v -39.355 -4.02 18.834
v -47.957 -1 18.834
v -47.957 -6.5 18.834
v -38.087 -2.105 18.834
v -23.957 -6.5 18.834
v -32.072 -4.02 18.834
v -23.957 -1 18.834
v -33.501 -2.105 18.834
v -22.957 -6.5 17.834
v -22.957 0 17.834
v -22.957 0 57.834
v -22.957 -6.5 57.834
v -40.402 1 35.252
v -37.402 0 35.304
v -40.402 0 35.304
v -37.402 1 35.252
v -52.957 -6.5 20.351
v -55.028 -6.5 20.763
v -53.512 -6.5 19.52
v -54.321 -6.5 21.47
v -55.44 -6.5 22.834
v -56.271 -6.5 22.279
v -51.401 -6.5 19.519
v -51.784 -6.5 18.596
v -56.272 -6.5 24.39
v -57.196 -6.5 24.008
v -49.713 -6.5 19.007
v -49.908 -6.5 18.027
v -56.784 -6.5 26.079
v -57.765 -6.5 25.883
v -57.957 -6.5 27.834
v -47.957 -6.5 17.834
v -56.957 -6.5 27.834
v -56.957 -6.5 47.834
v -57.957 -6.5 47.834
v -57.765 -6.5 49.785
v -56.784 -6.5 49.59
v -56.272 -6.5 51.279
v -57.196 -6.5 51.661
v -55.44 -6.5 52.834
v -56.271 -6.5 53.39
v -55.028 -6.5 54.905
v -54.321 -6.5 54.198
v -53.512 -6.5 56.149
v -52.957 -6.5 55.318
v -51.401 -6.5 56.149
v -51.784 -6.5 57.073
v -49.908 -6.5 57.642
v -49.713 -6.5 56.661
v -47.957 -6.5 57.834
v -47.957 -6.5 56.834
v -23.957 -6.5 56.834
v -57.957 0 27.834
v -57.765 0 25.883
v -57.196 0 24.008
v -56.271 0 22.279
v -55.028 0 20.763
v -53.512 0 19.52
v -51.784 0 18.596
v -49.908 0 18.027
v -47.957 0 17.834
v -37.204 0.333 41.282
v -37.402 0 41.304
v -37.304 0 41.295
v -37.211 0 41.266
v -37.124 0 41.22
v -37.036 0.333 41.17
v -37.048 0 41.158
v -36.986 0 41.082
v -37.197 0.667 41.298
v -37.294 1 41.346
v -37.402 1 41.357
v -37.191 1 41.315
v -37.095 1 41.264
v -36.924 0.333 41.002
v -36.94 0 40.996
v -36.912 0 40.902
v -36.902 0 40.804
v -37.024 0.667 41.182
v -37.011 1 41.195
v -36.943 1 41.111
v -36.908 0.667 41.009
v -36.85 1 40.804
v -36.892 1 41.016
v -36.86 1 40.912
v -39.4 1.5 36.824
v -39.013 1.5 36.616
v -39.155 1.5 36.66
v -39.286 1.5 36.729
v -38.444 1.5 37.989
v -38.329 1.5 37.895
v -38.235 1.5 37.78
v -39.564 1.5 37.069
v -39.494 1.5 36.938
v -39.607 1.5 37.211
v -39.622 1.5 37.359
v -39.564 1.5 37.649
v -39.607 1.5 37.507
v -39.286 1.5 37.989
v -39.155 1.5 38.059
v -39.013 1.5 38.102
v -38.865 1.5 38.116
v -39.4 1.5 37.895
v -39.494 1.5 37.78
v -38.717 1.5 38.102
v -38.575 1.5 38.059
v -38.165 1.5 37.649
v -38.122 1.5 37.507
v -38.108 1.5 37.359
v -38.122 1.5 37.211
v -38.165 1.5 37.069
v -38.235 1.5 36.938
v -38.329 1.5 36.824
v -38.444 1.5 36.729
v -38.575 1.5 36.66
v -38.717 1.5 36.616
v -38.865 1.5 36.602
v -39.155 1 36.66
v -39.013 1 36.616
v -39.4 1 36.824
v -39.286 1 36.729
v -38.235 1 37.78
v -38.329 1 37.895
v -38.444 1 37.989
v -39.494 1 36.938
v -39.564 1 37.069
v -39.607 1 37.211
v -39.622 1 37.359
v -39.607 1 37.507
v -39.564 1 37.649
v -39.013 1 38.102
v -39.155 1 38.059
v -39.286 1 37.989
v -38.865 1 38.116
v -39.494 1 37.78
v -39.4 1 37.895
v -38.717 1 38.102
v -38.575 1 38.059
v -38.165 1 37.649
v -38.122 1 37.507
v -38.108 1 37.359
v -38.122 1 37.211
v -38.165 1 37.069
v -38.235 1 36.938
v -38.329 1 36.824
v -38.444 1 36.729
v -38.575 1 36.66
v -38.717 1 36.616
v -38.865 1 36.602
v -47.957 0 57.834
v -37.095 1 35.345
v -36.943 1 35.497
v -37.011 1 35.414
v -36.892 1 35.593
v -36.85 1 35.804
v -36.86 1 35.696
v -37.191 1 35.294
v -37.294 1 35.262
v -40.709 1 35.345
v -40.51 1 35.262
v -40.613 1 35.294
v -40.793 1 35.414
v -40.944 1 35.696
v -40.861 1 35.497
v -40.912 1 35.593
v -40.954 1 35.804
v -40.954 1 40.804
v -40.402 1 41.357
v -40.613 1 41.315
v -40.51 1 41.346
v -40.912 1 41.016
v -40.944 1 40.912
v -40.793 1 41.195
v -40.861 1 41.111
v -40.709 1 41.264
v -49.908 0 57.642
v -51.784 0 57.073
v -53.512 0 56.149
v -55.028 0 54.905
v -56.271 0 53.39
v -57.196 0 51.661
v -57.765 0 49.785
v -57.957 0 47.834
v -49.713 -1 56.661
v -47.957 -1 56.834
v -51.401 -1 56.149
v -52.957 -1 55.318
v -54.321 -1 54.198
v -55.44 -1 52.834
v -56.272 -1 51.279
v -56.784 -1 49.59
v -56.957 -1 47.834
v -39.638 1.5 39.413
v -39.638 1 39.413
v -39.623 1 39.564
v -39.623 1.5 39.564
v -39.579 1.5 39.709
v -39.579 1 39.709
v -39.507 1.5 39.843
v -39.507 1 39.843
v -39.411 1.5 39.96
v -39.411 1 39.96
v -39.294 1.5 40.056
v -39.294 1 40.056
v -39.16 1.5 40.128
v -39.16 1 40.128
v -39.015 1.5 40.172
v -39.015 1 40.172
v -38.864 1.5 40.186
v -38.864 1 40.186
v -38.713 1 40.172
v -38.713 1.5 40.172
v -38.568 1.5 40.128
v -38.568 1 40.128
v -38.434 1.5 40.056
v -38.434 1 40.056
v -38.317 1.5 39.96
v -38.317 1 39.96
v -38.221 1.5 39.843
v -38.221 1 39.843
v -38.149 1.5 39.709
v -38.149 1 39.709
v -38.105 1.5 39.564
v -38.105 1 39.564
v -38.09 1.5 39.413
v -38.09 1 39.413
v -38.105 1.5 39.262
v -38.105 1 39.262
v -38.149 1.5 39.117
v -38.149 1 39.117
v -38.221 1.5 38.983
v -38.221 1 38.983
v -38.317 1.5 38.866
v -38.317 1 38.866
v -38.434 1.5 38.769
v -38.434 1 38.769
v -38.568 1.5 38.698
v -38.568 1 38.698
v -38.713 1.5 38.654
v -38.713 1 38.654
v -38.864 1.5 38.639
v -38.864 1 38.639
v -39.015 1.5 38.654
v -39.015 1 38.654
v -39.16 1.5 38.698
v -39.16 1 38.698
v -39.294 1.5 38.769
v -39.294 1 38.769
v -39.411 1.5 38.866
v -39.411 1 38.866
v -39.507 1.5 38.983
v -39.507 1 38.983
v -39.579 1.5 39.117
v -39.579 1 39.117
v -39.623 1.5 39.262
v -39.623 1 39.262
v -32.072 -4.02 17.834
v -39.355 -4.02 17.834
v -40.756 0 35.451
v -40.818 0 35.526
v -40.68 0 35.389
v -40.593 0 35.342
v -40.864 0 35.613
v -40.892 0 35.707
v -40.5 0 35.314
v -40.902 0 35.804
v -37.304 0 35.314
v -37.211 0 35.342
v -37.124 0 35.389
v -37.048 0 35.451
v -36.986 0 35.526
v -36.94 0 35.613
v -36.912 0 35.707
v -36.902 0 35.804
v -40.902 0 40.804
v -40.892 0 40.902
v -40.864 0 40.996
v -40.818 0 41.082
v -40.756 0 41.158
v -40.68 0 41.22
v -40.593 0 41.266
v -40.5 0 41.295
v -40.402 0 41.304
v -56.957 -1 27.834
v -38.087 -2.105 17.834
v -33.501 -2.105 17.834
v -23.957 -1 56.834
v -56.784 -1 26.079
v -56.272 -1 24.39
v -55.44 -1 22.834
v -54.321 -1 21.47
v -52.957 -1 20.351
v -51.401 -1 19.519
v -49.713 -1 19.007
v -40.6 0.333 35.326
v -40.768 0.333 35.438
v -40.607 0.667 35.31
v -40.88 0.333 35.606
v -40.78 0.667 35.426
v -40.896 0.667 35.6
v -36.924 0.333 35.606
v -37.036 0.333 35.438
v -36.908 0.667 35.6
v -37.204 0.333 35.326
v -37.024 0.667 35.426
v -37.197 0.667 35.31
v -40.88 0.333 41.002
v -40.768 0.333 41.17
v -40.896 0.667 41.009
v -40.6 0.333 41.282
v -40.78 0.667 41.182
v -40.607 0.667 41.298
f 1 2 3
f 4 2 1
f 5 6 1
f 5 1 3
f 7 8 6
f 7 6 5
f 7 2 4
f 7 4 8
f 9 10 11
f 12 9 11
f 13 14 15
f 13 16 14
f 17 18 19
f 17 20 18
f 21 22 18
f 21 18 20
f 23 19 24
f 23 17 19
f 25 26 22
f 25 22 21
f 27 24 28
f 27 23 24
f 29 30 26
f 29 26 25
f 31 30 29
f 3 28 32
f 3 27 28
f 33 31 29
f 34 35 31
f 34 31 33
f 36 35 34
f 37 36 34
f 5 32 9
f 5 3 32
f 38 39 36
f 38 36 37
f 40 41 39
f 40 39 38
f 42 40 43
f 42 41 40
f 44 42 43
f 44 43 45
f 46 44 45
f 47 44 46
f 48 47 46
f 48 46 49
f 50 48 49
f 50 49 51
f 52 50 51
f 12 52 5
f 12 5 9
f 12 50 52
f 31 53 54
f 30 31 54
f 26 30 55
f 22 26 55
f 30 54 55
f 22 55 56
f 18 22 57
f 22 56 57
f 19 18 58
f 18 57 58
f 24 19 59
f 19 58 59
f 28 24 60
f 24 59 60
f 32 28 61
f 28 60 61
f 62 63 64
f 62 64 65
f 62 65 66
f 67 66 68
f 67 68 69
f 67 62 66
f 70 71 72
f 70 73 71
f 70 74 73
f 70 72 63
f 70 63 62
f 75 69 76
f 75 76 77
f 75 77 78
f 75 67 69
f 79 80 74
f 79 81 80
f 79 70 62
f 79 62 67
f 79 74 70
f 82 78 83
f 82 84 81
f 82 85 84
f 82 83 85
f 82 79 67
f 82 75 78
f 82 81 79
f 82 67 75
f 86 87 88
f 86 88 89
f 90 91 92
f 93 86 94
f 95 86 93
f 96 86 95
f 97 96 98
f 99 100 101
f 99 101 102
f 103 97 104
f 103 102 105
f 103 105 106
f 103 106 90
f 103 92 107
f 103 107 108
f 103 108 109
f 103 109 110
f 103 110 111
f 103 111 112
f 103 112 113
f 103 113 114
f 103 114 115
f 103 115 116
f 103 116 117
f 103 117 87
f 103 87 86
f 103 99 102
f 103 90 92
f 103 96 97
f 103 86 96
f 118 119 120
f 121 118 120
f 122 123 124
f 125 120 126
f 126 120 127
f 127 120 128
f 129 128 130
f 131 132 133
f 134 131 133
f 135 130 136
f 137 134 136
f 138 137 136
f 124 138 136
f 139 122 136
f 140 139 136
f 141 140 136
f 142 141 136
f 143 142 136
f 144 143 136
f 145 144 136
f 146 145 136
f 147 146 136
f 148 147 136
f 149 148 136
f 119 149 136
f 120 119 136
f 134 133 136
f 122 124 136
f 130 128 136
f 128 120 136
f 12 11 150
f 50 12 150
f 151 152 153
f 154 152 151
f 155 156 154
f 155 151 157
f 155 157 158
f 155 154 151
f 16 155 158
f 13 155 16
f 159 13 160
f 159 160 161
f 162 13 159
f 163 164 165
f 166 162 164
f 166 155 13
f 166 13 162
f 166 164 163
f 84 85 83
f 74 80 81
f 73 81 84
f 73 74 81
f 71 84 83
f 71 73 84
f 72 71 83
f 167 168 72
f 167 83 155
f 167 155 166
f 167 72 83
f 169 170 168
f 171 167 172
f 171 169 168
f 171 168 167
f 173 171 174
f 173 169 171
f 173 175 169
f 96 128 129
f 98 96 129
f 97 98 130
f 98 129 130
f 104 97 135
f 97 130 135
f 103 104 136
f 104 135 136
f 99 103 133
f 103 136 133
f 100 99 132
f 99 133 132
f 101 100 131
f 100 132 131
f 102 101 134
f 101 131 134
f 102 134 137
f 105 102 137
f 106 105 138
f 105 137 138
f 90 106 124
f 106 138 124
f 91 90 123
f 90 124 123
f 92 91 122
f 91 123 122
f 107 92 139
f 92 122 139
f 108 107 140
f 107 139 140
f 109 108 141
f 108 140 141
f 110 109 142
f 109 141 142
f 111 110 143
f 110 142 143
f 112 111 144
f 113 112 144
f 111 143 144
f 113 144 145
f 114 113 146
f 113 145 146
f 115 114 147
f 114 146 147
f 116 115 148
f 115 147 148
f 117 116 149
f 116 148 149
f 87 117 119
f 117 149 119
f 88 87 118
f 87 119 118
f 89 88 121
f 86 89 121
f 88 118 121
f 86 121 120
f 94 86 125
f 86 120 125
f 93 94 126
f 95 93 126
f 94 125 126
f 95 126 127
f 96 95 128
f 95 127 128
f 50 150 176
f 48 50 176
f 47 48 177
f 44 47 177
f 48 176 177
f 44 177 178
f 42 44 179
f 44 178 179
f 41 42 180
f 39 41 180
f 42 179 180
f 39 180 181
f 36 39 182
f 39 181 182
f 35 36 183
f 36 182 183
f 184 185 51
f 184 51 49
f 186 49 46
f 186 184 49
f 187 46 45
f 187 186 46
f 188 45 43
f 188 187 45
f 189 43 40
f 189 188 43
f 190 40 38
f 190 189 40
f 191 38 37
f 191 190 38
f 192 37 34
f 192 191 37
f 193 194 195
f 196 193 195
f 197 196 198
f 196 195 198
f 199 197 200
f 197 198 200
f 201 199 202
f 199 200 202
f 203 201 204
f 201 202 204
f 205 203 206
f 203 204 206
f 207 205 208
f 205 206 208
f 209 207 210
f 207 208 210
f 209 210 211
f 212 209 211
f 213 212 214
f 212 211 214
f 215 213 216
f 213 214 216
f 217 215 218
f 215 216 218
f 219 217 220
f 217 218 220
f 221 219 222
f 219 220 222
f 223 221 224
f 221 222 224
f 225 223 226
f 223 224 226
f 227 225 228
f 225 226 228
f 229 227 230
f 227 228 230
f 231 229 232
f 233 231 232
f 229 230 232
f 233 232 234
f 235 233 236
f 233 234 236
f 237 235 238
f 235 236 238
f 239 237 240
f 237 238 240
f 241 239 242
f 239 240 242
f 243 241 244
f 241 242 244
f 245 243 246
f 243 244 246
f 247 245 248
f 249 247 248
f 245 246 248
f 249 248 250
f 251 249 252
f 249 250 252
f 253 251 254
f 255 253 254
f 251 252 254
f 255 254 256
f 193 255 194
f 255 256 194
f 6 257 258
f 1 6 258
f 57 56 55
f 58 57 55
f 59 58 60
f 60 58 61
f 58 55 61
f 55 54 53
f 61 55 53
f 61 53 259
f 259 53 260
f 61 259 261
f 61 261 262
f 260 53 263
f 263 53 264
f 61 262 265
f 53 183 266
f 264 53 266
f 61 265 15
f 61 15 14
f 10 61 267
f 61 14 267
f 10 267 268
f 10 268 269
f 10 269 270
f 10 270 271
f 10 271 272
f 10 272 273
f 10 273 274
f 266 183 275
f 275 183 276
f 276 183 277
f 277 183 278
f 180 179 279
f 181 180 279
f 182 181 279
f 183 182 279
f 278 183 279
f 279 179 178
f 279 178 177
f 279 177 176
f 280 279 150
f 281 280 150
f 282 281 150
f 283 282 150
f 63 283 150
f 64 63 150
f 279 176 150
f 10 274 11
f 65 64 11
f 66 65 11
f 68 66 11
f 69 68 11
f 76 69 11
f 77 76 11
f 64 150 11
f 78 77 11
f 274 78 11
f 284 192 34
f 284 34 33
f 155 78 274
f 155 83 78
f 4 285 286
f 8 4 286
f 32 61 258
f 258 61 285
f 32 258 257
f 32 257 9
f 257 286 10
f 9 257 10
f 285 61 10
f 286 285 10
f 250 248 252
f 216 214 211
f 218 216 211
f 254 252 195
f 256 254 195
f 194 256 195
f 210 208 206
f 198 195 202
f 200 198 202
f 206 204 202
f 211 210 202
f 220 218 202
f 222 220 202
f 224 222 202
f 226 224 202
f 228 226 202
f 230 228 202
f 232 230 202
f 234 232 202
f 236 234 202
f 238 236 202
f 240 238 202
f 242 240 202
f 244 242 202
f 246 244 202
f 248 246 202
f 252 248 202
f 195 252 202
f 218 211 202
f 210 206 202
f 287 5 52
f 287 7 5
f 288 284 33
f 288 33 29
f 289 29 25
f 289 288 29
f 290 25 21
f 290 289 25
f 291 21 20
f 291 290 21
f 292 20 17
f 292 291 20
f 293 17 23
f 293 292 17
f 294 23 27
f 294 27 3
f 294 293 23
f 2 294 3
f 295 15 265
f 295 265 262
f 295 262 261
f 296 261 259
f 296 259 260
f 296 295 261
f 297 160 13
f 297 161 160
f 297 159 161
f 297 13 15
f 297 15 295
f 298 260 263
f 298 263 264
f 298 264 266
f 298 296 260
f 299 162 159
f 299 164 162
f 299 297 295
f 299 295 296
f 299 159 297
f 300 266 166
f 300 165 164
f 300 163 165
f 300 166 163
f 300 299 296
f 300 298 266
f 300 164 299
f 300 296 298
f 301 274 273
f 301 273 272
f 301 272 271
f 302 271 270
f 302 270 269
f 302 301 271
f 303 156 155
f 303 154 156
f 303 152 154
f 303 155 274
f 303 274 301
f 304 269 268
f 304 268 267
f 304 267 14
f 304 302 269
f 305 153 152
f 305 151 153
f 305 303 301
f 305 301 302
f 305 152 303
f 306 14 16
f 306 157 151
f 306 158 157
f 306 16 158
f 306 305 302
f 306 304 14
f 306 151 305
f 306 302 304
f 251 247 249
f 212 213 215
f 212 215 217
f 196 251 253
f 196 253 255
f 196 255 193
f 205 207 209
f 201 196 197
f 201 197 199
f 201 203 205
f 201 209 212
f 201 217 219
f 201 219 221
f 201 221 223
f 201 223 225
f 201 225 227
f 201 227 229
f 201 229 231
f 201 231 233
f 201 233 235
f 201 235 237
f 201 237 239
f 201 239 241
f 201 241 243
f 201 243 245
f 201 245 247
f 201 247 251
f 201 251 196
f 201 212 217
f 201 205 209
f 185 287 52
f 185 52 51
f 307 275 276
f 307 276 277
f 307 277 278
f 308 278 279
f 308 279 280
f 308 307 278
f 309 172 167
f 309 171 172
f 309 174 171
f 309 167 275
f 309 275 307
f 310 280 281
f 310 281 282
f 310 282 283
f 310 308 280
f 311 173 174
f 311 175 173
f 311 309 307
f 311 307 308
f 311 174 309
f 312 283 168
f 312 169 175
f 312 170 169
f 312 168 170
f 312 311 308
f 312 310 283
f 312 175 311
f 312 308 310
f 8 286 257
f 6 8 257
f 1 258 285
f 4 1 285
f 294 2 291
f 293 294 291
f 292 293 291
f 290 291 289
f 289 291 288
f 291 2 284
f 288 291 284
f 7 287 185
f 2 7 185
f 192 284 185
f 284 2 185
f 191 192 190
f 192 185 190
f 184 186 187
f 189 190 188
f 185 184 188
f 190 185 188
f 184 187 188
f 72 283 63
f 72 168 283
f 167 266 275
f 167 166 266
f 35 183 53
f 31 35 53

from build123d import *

# Parameters (mm, degrees)
F1_DEPTH      = 6.5
F2_T          = -1
F4_DEPTH      = 25
F6_DEPTH      = 1
F6_TAPER      = -3
F6_DEPTH_BACK = 1
F8_R          = 0.7736909367
F9_DEPTH      = 0.5
F8_R_2        = 0.7572129145


with BuildPart() as f1:
    # F0 (on Front) → F1 (new body)
    with BuildSketch(Plane.XZ):
        with BuildLine():
            Line((-22.9567318037, 57.8343560425), (-47.9567318037, 57.8343560425))
            ThreePointArc((-47.9567318037, 57.8343560425), (-55.0277996156, 54.9054238543), (-57.9567318037, 47.8343560425))
            Line((-57.9567318037, 47.8343560425), (-57.9567318037, 27.8343560425))
            ThreePointArc((-57.9567318037, 27.8343560425), (-55.0277996156, 20.7632882306), (-47.9567318037, 17.8343560425))
            Line((-47.9567318037, 17.8343560425), (-22.9567318037, 17.8343560425))
            Line((-22.9567318037, 17.8343560425), (-22.9567318037, 57.8343560425))
        make_face()
    extrude(amount=F1_DEPTH)

    # F2
    f2_openings = [f1.faces().sort_by_distance(p)[0] for p in [
        (-39.973904, -6.5, 37.834356),
    ]]
    offset(amount=F2_T, openings=f2_openings)

    # F3 (on face) → F4 (cut)
    with BuildSketch(Plane(origin=(0, 0, 17.8343560425), x_dir=(1, 0, 0), z_dir=(0, 0, -1))):
        Polygon((-32.0718251169, 4.0201582015), (-39.3545180559, 4.0201582015), (-38.0867905915, 2.1050791256), (-33.5013903677, 2.1050791256), align=None)
    extrude(amount=-F4_DEPTH, mode=Mode.SUBTRACT)

    # F5 (on face) → F6 (join, two sides)
    with BuildSketch(Plane(origin=(0, 0, 0), x_dir=(-1, 0, 0), z_dir=(0, 1, 0))) as f6_sk:
        with BuildLine():
            ThreePointArc((40.9020219445, 40.8042357862), (40.7555753351, 41.1577891768), (40.4020219445, 41.3042357862))
            Line((40.4020219445, 41.3042357862), (37.4020219445, 41.3042357862))
            ThreePointArc((37.4020219445, 41.3042357862), (37.0484685539, 41.1577891768), (36.9020219445, 40.8042357862))
            Line((36.9020219445, 40.8042357862), (36.9020219445, 35.8042357862))
            ThreePointArc((36.9020219445, 35.8042357862), (37.0484685539, 35.4506823956), (37.4020219445, 35.3042357862))
            Line((37.4020219445, 35.3042357862), (40.4020219445, 35.3042357862))
            ThreePointArc((40.4020219445, 35.3042357862), (40.7555753351, 35.4506823956), (40.9020219445, 35.8042357862))
            Line((40.9020219445, 35.8042357862), (40.9020219445, 40.8042357862))
        make_face()
    extrude(amount=F6_DEPTH, taper=F6_TAPER)
    extrude(f6_sk.sketch, amount=-F6_DEPTH_BACK)


with BuildPart() as f9:
    # F8 (on face) → F9 (new body)
    with BuildSketch(Plane(origin=(0, 1, 0), x_dir=(-1, 0, 0), z_dir=(0, 1, 0))):
        with Locations((38.8640463352, 39.4127853215)):
            Circle(F8_R)
    extrude(amount=F9_DEPTH)


with BuildPart() as f9b:
    # F8 (on face) → F9, piece 2 (new body)
    with BuildSketch(Plane(origin=(0, 1, 0), x_dir=(-1, 0, 0), z_dir=(0, 1, 0))):
        with Locations((38.8648360968, 37.359084934)):
            Circle(F8_R_2)
    extrude(amount=F9_DEPTH)


solid = Compound([f1.part, f9.part, f9b.part])
